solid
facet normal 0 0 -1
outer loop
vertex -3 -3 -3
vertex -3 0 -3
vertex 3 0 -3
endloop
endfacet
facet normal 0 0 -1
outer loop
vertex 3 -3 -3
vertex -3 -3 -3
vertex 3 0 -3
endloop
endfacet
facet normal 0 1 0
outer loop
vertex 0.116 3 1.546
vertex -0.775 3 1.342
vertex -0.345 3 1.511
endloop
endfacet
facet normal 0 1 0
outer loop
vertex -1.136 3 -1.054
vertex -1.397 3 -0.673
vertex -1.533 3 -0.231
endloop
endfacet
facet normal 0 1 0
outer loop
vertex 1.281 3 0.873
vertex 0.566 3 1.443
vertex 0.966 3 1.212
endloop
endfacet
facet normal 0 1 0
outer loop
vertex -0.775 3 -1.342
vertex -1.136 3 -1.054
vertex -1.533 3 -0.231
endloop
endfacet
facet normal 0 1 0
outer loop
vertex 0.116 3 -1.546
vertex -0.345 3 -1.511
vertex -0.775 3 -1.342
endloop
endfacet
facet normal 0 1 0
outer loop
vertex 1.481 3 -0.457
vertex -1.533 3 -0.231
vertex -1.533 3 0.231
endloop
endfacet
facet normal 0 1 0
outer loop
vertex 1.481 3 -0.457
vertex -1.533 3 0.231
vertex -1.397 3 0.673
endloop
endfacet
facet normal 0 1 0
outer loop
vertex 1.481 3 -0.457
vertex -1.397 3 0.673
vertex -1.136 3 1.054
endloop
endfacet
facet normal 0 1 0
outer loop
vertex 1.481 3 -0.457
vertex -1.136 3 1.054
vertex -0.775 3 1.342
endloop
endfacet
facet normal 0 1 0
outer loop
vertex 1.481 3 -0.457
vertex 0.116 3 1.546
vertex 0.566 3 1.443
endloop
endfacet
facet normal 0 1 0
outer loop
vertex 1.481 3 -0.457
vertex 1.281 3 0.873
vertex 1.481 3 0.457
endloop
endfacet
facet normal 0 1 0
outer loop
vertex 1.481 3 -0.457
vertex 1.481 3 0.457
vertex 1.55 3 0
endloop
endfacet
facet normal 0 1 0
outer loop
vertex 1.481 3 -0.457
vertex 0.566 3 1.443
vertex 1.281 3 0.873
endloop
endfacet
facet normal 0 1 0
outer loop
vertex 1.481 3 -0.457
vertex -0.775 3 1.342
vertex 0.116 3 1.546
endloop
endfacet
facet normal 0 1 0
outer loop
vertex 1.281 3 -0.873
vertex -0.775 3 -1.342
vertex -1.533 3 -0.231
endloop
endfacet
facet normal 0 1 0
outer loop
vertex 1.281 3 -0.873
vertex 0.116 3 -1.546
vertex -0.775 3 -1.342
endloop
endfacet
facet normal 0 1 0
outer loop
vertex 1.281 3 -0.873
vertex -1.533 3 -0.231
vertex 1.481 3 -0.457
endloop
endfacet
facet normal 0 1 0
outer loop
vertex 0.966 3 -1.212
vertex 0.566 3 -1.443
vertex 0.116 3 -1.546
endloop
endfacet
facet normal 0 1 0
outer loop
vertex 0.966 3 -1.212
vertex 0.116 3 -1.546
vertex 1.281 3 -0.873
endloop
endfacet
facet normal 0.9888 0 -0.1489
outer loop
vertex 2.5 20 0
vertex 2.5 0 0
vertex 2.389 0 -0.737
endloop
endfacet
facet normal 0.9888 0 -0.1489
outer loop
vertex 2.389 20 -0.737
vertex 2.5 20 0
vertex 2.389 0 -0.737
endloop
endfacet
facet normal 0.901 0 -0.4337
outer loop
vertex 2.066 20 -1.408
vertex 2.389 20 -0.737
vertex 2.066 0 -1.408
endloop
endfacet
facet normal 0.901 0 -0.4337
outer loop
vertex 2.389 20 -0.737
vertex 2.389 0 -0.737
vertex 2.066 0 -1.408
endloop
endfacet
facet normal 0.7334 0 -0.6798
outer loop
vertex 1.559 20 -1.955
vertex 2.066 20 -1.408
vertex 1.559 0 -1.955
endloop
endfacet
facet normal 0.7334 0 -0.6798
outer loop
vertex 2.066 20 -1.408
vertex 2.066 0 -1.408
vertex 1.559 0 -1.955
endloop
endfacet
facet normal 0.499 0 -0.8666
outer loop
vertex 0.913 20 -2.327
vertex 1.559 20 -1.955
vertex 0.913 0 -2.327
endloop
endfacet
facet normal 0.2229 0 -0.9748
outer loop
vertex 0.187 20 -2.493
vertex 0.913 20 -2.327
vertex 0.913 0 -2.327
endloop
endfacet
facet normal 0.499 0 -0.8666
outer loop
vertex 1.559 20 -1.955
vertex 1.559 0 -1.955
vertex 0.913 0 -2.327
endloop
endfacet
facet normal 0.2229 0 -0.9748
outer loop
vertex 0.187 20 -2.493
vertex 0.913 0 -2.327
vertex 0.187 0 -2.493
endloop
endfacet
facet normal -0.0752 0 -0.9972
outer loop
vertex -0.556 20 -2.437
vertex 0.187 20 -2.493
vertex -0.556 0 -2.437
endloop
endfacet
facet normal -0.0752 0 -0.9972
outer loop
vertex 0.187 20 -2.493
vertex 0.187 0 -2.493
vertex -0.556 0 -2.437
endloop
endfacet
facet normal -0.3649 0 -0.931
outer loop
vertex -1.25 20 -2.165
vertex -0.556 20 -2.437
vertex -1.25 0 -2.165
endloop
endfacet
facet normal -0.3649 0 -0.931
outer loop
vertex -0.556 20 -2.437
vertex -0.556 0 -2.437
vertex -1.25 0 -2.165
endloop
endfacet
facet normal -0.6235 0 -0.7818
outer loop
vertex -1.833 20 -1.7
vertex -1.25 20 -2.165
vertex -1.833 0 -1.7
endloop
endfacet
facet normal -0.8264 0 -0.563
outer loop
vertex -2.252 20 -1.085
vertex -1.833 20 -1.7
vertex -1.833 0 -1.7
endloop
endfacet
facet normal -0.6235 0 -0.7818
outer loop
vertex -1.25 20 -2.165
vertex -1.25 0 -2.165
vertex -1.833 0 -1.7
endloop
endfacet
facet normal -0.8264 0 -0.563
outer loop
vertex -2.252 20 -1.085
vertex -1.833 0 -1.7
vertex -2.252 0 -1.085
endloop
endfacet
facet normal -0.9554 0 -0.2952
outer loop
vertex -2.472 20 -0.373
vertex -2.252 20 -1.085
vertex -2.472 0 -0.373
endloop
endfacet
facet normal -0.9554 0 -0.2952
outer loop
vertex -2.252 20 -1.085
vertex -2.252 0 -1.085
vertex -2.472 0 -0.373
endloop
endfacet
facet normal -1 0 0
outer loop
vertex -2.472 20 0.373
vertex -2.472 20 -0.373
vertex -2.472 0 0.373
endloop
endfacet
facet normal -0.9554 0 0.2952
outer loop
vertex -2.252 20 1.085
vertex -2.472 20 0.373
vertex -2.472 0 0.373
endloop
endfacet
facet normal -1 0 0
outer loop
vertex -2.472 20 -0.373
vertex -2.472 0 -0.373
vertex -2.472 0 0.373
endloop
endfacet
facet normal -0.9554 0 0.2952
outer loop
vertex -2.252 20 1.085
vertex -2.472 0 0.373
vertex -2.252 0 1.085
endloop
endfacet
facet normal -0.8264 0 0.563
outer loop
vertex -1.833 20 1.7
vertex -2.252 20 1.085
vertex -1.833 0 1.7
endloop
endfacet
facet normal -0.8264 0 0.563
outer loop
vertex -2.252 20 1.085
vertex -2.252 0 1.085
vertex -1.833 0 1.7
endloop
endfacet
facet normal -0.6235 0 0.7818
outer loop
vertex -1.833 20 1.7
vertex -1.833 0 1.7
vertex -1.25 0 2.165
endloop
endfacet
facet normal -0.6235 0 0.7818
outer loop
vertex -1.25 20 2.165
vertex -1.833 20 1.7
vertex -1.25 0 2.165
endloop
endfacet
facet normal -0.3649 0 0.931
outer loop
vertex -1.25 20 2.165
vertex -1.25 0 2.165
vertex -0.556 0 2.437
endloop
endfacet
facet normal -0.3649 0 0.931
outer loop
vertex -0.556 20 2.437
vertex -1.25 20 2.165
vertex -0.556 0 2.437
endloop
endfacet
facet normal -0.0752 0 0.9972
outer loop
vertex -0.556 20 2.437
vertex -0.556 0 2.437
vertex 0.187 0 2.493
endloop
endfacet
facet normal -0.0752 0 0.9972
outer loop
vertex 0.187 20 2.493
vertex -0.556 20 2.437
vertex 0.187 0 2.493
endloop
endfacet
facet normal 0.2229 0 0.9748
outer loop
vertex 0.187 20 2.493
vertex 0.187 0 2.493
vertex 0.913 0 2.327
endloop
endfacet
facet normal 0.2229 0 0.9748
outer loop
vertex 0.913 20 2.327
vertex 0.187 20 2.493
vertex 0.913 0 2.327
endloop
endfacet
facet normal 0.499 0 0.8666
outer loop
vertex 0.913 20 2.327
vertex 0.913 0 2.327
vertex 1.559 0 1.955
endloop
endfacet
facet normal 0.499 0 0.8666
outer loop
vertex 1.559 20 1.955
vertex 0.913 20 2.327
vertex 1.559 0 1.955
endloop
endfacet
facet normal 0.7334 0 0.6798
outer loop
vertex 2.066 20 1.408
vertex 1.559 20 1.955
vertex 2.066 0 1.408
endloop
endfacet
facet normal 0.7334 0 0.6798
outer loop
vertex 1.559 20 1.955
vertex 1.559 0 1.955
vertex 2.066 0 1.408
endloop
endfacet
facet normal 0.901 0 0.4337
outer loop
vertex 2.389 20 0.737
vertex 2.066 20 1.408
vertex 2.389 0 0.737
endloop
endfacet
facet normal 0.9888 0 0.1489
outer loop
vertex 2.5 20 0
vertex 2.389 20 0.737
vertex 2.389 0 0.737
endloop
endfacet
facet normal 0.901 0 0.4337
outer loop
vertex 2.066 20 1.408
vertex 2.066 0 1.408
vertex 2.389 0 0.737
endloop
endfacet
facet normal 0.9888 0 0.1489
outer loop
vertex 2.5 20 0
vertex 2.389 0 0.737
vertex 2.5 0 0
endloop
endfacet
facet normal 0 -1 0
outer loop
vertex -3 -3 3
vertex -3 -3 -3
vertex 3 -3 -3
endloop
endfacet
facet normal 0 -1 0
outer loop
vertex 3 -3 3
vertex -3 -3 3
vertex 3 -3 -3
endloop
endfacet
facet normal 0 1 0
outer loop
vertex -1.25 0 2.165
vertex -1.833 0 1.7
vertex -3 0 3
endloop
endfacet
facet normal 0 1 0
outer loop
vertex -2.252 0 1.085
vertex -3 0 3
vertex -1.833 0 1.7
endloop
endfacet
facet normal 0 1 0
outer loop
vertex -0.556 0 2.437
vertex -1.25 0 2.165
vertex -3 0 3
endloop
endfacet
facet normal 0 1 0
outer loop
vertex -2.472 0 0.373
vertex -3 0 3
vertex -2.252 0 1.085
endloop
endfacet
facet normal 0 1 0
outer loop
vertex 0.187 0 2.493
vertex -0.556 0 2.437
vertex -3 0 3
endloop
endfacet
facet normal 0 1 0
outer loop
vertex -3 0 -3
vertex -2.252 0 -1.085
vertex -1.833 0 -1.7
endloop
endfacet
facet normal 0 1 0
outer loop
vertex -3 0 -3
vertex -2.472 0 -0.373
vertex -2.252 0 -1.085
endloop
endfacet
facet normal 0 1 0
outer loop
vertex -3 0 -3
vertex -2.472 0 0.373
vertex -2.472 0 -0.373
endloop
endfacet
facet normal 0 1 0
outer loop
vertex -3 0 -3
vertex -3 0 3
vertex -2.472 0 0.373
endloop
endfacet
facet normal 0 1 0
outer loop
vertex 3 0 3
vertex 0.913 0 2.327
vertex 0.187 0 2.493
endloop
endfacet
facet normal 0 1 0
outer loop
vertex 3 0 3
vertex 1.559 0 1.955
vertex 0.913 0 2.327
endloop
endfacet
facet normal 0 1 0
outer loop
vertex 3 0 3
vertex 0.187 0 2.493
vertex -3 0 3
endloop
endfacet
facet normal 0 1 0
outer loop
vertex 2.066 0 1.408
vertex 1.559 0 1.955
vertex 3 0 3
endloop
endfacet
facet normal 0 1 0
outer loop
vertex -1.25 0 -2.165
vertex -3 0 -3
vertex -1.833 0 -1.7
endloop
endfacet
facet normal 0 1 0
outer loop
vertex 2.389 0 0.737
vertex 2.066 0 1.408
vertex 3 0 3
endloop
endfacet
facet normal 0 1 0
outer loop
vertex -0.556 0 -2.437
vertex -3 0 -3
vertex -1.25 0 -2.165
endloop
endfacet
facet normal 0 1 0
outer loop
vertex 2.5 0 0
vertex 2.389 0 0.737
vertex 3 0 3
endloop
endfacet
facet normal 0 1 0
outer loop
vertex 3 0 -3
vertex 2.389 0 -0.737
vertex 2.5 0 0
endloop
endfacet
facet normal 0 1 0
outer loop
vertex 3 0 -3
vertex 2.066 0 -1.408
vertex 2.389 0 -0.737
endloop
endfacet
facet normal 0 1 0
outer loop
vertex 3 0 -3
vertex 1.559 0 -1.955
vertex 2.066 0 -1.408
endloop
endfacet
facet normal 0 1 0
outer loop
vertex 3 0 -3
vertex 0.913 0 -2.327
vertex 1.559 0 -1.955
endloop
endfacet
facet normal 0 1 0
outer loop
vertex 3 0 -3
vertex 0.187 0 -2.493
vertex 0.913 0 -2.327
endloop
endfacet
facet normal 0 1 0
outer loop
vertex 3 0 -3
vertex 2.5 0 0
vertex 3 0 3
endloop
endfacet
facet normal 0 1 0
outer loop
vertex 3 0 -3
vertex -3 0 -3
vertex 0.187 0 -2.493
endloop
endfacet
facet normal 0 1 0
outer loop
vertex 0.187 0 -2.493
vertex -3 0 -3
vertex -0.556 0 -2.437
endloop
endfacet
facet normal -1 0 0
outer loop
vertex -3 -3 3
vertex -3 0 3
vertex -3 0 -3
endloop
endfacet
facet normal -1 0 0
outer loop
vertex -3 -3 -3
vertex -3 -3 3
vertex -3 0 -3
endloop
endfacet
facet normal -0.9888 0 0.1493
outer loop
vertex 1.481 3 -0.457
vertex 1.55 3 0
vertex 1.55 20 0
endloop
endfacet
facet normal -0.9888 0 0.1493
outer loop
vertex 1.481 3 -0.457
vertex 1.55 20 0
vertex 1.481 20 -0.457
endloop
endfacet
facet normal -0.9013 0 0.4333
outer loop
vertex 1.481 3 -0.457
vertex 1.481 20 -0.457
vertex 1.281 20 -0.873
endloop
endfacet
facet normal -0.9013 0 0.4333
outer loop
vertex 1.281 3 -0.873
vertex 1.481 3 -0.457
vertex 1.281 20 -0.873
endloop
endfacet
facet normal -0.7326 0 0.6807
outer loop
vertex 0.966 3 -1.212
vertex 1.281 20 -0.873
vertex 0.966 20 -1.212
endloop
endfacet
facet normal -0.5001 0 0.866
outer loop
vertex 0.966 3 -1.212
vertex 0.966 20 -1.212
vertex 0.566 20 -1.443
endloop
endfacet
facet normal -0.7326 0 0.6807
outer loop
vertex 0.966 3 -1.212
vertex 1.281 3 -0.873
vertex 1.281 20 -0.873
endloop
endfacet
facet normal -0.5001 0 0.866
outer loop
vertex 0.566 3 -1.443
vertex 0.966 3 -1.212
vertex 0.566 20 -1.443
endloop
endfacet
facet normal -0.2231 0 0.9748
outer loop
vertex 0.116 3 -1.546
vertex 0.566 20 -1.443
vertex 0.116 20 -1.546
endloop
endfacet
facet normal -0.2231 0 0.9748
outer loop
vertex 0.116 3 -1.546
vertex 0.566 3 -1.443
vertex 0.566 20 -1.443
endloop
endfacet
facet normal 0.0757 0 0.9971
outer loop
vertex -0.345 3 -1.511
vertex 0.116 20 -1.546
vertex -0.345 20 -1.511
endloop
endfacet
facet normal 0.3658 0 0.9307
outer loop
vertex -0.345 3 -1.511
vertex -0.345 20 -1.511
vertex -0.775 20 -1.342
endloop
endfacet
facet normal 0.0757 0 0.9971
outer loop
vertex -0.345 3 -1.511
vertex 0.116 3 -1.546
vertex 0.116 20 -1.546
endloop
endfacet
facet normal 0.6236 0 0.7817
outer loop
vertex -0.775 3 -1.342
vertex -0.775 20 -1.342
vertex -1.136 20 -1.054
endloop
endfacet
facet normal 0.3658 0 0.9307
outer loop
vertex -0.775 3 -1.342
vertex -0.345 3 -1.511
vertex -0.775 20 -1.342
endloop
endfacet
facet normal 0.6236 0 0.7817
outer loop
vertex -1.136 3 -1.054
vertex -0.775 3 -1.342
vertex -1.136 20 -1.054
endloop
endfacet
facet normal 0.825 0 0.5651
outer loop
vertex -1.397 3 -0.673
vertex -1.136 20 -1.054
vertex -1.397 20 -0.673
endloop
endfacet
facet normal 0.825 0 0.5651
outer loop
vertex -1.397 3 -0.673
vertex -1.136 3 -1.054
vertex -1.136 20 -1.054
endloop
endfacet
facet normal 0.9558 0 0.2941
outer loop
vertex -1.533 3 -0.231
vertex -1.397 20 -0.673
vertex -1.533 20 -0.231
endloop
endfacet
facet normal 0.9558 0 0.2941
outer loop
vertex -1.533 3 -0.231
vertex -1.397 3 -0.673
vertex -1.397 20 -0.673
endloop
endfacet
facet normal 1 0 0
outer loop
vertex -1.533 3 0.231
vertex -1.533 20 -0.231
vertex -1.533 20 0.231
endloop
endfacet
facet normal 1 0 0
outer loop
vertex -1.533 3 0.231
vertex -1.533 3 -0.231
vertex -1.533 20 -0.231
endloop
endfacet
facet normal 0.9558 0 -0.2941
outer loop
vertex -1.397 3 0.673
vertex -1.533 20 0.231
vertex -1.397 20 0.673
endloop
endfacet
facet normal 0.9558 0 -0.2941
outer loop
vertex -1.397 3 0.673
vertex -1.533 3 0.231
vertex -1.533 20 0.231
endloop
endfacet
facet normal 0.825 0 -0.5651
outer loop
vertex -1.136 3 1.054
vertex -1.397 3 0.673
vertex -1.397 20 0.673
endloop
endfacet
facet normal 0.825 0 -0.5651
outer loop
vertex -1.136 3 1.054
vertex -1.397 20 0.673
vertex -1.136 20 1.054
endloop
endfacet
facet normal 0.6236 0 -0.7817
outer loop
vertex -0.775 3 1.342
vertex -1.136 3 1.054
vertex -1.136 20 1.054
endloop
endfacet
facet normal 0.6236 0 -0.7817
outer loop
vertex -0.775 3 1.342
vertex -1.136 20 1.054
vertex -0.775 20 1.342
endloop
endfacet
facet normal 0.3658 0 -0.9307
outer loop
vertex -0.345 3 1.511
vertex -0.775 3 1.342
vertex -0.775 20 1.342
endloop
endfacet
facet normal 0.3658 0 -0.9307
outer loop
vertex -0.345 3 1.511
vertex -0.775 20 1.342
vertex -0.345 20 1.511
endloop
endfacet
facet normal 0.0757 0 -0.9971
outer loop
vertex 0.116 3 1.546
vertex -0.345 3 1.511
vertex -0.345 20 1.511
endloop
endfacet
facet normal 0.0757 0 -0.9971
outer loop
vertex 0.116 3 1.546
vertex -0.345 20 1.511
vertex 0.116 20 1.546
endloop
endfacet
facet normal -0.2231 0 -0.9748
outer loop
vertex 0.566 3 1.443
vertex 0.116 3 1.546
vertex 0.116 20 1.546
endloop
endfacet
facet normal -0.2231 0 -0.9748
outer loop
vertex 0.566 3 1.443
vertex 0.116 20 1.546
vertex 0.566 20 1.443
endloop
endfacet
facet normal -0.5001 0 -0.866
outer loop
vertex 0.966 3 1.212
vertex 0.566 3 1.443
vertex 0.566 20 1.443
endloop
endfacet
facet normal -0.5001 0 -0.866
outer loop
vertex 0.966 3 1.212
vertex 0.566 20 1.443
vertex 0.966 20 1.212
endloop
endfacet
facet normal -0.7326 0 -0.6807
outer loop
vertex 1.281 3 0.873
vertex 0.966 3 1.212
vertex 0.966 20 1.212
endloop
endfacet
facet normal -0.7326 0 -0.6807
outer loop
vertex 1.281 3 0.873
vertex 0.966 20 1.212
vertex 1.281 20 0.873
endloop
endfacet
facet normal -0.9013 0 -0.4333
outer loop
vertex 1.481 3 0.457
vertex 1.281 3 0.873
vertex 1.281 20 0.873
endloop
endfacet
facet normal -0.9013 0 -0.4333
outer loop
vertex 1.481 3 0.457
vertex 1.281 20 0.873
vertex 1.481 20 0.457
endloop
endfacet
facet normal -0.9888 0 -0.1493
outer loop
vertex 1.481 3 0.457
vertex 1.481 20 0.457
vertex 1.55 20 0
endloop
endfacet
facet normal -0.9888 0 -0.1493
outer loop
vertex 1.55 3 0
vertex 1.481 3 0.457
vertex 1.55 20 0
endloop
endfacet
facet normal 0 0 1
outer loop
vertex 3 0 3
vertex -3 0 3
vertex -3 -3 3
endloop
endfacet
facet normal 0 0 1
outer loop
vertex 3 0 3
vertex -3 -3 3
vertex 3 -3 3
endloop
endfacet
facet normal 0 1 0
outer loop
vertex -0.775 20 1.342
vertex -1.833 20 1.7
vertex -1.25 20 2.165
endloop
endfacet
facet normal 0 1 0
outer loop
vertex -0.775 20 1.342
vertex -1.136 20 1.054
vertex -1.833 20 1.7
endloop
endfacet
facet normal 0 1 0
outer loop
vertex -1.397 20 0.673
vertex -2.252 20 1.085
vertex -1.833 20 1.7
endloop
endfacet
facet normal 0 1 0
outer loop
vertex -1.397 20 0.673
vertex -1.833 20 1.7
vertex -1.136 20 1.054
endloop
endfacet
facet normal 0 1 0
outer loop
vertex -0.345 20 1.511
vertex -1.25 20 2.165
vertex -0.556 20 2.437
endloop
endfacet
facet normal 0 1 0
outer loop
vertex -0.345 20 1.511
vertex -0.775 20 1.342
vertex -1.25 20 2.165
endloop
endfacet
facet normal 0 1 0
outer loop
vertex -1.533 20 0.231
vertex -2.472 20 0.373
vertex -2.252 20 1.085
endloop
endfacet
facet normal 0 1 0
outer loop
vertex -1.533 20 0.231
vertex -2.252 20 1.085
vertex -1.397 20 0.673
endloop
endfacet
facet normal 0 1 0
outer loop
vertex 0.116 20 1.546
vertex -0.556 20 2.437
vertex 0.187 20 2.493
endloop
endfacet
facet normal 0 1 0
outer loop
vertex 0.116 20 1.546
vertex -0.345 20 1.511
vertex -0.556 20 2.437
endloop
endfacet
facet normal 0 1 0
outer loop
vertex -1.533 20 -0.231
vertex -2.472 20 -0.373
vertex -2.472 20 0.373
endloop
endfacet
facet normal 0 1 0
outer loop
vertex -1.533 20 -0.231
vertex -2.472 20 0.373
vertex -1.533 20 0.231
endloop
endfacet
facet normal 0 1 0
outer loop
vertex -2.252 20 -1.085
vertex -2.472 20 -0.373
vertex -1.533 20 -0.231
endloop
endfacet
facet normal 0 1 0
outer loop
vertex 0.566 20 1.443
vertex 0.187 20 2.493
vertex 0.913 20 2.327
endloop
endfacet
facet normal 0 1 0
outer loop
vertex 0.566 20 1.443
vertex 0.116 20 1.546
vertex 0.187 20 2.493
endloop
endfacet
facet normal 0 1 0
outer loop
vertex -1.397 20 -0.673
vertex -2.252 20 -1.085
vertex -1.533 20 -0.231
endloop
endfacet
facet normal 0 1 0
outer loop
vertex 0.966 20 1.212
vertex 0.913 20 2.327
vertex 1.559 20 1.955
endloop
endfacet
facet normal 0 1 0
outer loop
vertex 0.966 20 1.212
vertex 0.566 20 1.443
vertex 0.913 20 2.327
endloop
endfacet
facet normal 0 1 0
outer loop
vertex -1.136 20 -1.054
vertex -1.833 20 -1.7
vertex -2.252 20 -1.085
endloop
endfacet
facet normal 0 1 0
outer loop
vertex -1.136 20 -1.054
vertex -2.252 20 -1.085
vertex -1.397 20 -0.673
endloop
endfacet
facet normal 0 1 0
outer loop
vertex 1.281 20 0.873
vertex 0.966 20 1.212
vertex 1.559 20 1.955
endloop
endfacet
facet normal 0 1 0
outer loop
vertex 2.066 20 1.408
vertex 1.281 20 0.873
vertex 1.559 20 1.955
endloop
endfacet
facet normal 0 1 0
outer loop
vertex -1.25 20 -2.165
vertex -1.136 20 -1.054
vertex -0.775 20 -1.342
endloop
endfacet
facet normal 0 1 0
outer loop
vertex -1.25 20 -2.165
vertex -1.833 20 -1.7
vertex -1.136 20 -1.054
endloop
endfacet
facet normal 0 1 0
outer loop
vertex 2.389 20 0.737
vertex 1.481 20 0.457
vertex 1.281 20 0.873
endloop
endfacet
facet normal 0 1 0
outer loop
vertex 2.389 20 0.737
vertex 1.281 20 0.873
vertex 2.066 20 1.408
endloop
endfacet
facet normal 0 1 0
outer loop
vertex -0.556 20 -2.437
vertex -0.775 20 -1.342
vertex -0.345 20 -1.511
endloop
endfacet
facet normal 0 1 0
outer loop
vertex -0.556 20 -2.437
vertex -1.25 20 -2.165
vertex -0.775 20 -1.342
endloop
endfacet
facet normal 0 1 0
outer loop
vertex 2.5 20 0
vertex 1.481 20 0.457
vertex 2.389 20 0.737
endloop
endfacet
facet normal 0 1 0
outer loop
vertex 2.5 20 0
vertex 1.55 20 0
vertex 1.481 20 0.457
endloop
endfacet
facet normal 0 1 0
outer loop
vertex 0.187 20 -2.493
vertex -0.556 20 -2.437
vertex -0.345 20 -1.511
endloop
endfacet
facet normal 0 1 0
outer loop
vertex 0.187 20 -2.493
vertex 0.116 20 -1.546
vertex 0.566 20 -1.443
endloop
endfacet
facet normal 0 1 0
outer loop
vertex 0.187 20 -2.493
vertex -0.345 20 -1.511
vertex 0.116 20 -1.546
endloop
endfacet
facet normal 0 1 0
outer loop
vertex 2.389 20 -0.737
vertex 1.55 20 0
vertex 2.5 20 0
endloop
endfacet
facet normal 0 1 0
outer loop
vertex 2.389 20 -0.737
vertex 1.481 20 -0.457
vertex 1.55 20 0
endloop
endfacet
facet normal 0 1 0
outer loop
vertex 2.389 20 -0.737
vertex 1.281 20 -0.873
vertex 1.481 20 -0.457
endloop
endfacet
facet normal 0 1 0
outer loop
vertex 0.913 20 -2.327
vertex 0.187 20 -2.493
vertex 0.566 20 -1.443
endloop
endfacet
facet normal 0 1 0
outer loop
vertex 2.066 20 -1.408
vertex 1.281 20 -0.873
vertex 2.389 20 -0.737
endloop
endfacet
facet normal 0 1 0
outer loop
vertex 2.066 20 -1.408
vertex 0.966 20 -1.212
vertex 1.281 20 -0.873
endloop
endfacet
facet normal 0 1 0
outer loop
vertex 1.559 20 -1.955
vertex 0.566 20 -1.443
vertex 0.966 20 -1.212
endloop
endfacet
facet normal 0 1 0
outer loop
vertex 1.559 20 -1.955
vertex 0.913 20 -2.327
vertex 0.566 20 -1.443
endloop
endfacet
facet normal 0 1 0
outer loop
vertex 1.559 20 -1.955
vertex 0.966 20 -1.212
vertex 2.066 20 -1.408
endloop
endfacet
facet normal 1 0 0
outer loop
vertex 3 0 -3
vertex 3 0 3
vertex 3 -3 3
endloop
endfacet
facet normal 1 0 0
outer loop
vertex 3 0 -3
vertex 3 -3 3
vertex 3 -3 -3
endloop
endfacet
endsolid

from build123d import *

# Parameters (mm, degrees)
SKETCH1_W           = 6
SKETCH1_H           = 6
BOSS_EXTRUDE1_DEPTH = 3
SKETCH1_3_R         = 1.55
BOSS_EXTRUDE2_DEPTH = 3
SKETCH1_4_R         = 2.5
SKETCH1_4_R_2       = 1.55
BOSS_EXTRUDE3_DEPTH = 20


with BuildPart() as part:
    # Sketch1 → Boss-Extrude1 (new body)
    with BuildSketch(Plane(origin=(0, 0, 0), x_dir=(1, 0, 0), z_dir=(0, 1, 0))):
        Rectangle(SKETCH1_W, SKETCH1_H)
    extrude(amount=-BOSS_EXTRUDE1_DEPTH)

    # Sketch1<3> → Boss-Extrude2 (add)
    with BuildSketch(Plane(origin=(0, 0, 0), x_dir=(1, 0, 0), z_dir=(0, 1, 0))):
        Circle(SKETCH1_3_R)
    extrude(amount=BOSS_EXTRUDE2_DEPTH)

    # Sketch1<4> → Boss-Extrude3 (add)
    with BuildSketch(Plane(origin=(0, 0, 0), x_dir=(1, 0, 0), z_dir=(0, 1, 0))):
        Circle(SKETCH1_4_R)
        Circle(SKETCH1_4_R_2, mode=Mode.SUBTRACT)
    extrude(amount=BOSS_EXTRUDE3_DEPTH)


solid = part.part
